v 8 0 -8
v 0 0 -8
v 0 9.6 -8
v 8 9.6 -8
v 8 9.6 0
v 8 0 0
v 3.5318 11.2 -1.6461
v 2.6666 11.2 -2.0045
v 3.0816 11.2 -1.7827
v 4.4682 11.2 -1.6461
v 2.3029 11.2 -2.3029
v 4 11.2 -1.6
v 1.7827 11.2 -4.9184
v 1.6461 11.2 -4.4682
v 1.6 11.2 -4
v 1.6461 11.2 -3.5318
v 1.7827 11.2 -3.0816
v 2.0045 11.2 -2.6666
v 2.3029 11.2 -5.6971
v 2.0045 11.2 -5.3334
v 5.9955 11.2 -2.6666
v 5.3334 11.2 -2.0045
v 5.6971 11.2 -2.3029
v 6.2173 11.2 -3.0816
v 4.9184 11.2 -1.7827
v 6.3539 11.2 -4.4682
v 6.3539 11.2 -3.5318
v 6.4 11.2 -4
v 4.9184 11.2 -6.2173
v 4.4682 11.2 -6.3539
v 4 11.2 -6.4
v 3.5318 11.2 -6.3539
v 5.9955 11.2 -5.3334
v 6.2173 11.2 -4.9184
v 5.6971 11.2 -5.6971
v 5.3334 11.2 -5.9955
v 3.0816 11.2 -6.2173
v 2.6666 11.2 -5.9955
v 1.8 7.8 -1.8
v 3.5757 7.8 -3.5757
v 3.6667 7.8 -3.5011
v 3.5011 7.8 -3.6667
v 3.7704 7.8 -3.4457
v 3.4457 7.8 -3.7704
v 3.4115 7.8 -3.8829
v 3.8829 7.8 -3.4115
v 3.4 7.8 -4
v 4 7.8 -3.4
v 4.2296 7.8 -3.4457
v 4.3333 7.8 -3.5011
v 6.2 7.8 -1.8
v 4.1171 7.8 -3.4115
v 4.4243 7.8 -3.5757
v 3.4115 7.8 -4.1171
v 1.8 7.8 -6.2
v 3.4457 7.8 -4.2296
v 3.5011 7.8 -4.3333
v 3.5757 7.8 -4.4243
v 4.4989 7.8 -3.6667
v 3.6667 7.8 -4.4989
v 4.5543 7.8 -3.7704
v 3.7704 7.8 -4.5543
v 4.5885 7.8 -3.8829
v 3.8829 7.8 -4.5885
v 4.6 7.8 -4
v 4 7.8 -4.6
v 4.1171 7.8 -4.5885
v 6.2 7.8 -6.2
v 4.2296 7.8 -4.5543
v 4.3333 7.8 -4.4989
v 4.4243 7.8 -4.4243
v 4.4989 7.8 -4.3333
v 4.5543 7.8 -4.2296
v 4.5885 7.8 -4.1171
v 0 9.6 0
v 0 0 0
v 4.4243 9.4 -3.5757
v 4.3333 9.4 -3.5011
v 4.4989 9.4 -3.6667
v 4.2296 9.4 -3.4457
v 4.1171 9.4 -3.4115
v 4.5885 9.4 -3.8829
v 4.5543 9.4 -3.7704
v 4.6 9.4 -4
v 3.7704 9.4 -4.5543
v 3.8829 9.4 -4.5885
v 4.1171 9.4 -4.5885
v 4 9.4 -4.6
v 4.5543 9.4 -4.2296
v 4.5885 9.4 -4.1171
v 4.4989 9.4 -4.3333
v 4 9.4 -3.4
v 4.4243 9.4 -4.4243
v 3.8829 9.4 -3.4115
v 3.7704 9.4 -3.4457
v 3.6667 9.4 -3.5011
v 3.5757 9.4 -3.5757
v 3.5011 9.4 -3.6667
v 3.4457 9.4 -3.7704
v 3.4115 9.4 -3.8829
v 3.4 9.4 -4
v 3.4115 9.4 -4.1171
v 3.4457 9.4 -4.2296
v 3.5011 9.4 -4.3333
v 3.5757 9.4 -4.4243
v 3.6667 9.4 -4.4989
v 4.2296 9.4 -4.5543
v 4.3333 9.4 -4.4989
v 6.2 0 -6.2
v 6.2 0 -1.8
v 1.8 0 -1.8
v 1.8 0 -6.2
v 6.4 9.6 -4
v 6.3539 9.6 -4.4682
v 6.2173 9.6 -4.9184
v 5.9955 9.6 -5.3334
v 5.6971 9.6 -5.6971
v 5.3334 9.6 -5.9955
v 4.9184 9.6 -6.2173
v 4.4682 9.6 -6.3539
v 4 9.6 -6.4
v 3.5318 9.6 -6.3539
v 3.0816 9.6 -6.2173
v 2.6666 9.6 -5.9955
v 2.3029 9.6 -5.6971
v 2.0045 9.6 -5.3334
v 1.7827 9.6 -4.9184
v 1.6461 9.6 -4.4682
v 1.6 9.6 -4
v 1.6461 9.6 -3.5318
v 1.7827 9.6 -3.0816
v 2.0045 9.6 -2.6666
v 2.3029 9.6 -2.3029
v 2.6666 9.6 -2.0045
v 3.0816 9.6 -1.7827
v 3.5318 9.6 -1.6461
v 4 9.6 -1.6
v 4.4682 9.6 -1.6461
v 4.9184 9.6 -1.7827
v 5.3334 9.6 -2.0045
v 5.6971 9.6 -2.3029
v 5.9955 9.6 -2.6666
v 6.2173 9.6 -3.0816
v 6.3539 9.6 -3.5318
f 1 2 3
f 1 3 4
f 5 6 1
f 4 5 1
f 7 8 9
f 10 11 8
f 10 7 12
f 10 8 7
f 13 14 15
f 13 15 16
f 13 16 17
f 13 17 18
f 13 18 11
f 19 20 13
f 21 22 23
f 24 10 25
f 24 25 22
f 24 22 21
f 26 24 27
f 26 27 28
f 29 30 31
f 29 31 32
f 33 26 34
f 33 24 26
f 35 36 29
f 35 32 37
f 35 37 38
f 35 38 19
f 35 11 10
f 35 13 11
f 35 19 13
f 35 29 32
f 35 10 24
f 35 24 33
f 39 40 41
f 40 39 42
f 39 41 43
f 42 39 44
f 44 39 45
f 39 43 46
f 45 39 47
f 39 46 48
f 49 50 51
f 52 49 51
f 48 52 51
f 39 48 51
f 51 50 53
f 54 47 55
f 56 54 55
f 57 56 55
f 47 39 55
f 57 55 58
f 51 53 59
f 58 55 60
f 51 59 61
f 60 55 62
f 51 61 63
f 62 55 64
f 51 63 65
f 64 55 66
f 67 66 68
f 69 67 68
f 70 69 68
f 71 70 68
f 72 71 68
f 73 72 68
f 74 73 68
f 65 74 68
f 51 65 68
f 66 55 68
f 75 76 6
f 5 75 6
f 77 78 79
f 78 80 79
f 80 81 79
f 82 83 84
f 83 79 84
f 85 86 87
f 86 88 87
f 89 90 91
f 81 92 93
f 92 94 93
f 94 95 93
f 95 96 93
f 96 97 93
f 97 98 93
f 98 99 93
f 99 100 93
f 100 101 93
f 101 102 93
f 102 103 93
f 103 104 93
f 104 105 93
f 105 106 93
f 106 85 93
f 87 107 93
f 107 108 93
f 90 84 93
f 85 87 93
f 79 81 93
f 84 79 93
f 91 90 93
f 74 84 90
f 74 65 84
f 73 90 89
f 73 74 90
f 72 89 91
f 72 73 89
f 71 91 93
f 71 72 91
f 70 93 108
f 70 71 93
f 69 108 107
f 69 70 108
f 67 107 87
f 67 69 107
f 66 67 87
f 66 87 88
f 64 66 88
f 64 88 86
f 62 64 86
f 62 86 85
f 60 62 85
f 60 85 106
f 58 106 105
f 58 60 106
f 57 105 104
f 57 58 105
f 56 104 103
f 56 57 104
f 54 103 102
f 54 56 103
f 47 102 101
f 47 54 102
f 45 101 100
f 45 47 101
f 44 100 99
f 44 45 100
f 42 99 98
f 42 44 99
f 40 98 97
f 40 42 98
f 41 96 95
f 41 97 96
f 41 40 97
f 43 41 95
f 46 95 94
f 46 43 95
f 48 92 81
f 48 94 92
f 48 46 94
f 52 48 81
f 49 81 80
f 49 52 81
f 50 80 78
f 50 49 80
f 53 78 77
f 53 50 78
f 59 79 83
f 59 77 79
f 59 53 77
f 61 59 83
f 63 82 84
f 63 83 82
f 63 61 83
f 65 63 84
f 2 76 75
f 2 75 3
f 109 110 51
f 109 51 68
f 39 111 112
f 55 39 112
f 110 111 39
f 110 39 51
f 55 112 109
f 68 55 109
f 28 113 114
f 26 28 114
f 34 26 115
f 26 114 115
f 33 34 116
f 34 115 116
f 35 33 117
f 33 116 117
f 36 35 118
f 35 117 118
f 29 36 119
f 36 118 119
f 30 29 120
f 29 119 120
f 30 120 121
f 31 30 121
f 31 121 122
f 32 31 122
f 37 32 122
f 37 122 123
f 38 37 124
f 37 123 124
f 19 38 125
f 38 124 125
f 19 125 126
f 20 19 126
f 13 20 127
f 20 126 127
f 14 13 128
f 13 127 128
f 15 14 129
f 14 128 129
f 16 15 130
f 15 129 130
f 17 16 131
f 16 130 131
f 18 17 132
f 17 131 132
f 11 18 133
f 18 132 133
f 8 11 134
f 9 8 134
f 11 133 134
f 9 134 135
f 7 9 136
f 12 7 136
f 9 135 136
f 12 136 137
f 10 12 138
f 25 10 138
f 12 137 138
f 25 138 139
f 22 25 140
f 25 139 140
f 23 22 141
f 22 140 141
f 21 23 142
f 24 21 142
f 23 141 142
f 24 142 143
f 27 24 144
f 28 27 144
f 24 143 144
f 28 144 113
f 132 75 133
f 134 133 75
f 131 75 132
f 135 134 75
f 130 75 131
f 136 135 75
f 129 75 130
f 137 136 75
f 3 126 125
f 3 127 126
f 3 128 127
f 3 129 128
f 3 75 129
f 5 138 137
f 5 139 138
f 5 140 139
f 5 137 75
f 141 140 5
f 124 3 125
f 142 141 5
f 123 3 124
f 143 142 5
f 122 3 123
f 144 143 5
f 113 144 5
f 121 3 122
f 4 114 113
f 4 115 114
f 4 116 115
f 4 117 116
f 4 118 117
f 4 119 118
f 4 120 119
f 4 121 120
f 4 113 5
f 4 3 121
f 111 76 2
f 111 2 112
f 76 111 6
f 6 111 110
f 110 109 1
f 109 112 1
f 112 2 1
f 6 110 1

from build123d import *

# Parameters (mm, degrees)
SKETCH3_W           = 8
SKETCH3_H           = 8
BOSS_EXTRUDE1_DEPTH = 9.6
SKETCH4_R           = 2.4
BOSS_EXTRUDE2_DEPTH = 1.6
SHELL1_T            = -1.8


with BuildPart() as part:
    # Sketch3 → Boss-Extrude1 (new body)
    with BuildSketch(Plane(origin=(0, 0, 0), x_dir=(1, 0, 0), z_dir=(0, 1, 0))):
        with Locations((4, 4)):
            Rectangle(SKETCH3_W, SKETCH3_H)
    extrude(amount=BOSS_EXTRUDE1_DEPTH)

    # Sketch4 → Boss-Extrude2 (add)
    with BuildSketch(Plane(origin=(0, 9.6, 0), x_dir=(1, 0, 0), z_dir=(0, 1, 0))):
        with Locations((4, 4)):
            Circle(SKETCH4_R)
    extrude(amount=BOSS_EXTRUDE2_DEPTH)

    # Shell1
    shell1_openings = [part.faces().sort_by_distance(p)[0] for p in [
        (4, 0, -4),
    ]]
    offset(amount=SHELL1_T, openings=shell1_openings, kind=Kind.INTERSECTION)


solid = part.part
